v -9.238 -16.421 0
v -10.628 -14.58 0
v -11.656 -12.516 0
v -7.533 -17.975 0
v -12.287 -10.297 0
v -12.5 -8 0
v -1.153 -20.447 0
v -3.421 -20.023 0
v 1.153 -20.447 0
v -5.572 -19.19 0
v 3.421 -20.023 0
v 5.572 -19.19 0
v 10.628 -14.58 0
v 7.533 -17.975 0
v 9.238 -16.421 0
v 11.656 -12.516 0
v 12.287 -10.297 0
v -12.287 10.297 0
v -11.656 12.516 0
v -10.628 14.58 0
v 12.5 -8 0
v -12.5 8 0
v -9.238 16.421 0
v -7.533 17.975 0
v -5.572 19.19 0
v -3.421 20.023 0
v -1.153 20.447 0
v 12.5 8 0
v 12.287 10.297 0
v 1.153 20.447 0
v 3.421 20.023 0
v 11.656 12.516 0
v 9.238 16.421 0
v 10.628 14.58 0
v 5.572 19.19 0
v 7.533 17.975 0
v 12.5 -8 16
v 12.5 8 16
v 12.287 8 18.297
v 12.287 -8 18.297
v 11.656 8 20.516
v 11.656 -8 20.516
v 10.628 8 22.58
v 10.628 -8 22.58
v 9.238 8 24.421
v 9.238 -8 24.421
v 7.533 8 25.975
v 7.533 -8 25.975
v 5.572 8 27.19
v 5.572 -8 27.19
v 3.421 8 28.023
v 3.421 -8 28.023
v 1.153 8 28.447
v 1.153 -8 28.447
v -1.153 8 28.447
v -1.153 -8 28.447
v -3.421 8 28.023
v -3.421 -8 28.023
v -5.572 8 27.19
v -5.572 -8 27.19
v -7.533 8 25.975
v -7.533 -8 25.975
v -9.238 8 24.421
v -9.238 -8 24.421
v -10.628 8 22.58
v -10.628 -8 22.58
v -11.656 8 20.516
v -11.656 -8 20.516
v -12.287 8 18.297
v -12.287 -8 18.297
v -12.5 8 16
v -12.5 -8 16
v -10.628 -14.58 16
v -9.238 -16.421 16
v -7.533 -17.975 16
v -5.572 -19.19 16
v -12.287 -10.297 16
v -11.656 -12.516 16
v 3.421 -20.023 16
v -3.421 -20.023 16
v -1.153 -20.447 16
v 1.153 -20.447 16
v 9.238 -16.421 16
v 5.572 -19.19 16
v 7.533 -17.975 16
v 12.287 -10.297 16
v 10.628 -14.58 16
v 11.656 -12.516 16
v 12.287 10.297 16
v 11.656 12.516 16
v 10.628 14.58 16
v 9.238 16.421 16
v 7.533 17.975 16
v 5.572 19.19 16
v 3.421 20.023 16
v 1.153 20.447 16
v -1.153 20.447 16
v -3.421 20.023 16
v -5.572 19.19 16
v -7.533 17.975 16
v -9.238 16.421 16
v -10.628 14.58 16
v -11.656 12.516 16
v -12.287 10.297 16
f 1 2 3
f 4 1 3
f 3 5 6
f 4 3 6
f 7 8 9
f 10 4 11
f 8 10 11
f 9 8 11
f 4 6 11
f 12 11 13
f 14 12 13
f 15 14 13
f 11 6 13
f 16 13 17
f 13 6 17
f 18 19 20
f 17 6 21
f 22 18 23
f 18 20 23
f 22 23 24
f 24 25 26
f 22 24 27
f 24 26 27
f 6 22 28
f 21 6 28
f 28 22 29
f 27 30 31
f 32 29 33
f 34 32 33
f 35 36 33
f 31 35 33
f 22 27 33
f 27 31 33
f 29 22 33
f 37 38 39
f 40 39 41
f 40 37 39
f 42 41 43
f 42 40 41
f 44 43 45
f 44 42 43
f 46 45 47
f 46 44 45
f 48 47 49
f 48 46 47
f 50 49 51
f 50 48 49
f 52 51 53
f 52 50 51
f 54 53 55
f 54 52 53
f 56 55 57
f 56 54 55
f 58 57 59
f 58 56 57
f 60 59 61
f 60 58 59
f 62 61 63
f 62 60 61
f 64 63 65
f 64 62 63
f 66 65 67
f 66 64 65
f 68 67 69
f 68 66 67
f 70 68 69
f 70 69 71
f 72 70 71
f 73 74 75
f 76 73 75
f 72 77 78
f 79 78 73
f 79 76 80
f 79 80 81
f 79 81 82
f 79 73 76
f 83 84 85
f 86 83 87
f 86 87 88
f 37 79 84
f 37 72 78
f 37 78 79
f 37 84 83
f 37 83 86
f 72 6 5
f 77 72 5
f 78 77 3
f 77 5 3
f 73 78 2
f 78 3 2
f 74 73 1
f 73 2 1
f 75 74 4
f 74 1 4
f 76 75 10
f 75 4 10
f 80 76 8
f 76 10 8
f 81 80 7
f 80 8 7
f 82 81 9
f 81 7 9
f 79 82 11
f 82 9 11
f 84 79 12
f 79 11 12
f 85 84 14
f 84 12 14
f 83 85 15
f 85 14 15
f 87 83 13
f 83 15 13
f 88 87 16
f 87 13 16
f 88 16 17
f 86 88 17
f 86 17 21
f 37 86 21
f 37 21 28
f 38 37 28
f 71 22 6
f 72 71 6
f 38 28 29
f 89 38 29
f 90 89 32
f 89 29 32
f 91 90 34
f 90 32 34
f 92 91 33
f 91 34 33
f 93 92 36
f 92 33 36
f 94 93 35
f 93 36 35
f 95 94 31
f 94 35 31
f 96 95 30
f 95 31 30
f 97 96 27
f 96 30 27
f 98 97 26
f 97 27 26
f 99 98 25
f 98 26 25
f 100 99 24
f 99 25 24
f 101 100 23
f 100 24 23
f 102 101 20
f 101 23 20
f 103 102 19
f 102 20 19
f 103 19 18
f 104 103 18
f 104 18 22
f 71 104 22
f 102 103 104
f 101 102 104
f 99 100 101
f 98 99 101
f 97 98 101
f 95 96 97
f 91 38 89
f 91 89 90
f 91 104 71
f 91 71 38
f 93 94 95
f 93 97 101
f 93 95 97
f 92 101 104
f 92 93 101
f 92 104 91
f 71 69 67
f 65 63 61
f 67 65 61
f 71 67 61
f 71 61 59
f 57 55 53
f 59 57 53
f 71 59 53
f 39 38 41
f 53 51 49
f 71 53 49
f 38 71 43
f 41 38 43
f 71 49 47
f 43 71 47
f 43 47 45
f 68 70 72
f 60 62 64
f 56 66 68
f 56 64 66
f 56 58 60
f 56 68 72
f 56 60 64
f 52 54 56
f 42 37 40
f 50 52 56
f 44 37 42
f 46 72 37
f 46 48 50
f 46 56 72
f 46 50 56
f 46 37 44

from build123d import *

# Parameters (mm, degrees)
F0_R          = 12.5
F1_DEPTH      = 16
F2_R          = 12.5
F3_DEPTH      = 8
F3_DEPTH_BACK = 8
F5_DEPTH      = 16


with BuildPart() as f1:
    # F0 (on Top) → F1 (new body)
    with BuildSketch(Plane.XY):
        Circle(F0_R)
    extrude(amount=F1_DEPTH)

    # F2 (on Front) → F3 (join, two sides)
    with BuildSketch(Plane.XZ) as f3_sk:
        with Locations((0, 16)):
            Circle(F2_R)
    extrude(amount=F3_DEPTH)
    extrude(f3_sk.sketch, amount=-F3_DEPTH_BACK)

    # F4 (on Top) → F5 (join)
    with BuildSketch(Plane.XY):
        with BuildLine():
            Line((-12.5, 8), (12.5, 8))
            ThreePointArc((12.5, 8), (0, 20.5), (-12.5, 8))
        make_face()
        with BuildLine():
            Line((12.5, -8), (12.5, 8))
            ThreePointArc((12.5, 8), (11.7539052968, 3.7460947032), (9.6046863561, 0))
            ThreePointArc((9.6046863561, 0), (11.7539052968, -3.7460947032), (12.5, -8))
        make_face()
        with BuildLine():
            ThreePointArc((9.6046863561, 0), (11.7539052968, 3.7460947032), (12.5, 8))
            Line((12.5, 8), (-12.5, 8))
            ThreePointArc((-12.5, 8), (-11.7539052968, 3.7460947032), (-9.6046863561, 0))
            ThreePointArc((-9.6046863561, 0), (0, 4.5), (9.6046863561, 0))
        make_face()
        with BuildLine():
            ThreePointArc((-9.6046863561, 0), (-11.7539052968, 3.7460947032), (-12.5, 8))
            Line((-12.5, 8), (-12.5, -8))
            ThreePointArc((-12.5, -8), (-11.7539052968, -3.7460947032), (-9.6046863561, 0))
        make_face()
        with BuildLine():
            ThreePointArc((12.5, -8), (11.7539052968, -3.7460947032), (9.6046863561, 0))
            ThreePointArc((9.6046863561, 0), (0, -4.5), (-9.6046863561, 0))
            ThreePointArc((-9.6046863561, 0), (-11.7539052968, -3.7460947032), (-12.5, -8))
            Line((-12.5, -8), (12.5, -8))
        make_face()
        with BuildLine():
            ThreePointArc((-12.5, -8), (0, -20.5), (12.5, -8))
            Line((12.5, -8), (-12.5, -8))
        make_face()
    extrude(amount=F5_DEPTH)


solid = f1.part
